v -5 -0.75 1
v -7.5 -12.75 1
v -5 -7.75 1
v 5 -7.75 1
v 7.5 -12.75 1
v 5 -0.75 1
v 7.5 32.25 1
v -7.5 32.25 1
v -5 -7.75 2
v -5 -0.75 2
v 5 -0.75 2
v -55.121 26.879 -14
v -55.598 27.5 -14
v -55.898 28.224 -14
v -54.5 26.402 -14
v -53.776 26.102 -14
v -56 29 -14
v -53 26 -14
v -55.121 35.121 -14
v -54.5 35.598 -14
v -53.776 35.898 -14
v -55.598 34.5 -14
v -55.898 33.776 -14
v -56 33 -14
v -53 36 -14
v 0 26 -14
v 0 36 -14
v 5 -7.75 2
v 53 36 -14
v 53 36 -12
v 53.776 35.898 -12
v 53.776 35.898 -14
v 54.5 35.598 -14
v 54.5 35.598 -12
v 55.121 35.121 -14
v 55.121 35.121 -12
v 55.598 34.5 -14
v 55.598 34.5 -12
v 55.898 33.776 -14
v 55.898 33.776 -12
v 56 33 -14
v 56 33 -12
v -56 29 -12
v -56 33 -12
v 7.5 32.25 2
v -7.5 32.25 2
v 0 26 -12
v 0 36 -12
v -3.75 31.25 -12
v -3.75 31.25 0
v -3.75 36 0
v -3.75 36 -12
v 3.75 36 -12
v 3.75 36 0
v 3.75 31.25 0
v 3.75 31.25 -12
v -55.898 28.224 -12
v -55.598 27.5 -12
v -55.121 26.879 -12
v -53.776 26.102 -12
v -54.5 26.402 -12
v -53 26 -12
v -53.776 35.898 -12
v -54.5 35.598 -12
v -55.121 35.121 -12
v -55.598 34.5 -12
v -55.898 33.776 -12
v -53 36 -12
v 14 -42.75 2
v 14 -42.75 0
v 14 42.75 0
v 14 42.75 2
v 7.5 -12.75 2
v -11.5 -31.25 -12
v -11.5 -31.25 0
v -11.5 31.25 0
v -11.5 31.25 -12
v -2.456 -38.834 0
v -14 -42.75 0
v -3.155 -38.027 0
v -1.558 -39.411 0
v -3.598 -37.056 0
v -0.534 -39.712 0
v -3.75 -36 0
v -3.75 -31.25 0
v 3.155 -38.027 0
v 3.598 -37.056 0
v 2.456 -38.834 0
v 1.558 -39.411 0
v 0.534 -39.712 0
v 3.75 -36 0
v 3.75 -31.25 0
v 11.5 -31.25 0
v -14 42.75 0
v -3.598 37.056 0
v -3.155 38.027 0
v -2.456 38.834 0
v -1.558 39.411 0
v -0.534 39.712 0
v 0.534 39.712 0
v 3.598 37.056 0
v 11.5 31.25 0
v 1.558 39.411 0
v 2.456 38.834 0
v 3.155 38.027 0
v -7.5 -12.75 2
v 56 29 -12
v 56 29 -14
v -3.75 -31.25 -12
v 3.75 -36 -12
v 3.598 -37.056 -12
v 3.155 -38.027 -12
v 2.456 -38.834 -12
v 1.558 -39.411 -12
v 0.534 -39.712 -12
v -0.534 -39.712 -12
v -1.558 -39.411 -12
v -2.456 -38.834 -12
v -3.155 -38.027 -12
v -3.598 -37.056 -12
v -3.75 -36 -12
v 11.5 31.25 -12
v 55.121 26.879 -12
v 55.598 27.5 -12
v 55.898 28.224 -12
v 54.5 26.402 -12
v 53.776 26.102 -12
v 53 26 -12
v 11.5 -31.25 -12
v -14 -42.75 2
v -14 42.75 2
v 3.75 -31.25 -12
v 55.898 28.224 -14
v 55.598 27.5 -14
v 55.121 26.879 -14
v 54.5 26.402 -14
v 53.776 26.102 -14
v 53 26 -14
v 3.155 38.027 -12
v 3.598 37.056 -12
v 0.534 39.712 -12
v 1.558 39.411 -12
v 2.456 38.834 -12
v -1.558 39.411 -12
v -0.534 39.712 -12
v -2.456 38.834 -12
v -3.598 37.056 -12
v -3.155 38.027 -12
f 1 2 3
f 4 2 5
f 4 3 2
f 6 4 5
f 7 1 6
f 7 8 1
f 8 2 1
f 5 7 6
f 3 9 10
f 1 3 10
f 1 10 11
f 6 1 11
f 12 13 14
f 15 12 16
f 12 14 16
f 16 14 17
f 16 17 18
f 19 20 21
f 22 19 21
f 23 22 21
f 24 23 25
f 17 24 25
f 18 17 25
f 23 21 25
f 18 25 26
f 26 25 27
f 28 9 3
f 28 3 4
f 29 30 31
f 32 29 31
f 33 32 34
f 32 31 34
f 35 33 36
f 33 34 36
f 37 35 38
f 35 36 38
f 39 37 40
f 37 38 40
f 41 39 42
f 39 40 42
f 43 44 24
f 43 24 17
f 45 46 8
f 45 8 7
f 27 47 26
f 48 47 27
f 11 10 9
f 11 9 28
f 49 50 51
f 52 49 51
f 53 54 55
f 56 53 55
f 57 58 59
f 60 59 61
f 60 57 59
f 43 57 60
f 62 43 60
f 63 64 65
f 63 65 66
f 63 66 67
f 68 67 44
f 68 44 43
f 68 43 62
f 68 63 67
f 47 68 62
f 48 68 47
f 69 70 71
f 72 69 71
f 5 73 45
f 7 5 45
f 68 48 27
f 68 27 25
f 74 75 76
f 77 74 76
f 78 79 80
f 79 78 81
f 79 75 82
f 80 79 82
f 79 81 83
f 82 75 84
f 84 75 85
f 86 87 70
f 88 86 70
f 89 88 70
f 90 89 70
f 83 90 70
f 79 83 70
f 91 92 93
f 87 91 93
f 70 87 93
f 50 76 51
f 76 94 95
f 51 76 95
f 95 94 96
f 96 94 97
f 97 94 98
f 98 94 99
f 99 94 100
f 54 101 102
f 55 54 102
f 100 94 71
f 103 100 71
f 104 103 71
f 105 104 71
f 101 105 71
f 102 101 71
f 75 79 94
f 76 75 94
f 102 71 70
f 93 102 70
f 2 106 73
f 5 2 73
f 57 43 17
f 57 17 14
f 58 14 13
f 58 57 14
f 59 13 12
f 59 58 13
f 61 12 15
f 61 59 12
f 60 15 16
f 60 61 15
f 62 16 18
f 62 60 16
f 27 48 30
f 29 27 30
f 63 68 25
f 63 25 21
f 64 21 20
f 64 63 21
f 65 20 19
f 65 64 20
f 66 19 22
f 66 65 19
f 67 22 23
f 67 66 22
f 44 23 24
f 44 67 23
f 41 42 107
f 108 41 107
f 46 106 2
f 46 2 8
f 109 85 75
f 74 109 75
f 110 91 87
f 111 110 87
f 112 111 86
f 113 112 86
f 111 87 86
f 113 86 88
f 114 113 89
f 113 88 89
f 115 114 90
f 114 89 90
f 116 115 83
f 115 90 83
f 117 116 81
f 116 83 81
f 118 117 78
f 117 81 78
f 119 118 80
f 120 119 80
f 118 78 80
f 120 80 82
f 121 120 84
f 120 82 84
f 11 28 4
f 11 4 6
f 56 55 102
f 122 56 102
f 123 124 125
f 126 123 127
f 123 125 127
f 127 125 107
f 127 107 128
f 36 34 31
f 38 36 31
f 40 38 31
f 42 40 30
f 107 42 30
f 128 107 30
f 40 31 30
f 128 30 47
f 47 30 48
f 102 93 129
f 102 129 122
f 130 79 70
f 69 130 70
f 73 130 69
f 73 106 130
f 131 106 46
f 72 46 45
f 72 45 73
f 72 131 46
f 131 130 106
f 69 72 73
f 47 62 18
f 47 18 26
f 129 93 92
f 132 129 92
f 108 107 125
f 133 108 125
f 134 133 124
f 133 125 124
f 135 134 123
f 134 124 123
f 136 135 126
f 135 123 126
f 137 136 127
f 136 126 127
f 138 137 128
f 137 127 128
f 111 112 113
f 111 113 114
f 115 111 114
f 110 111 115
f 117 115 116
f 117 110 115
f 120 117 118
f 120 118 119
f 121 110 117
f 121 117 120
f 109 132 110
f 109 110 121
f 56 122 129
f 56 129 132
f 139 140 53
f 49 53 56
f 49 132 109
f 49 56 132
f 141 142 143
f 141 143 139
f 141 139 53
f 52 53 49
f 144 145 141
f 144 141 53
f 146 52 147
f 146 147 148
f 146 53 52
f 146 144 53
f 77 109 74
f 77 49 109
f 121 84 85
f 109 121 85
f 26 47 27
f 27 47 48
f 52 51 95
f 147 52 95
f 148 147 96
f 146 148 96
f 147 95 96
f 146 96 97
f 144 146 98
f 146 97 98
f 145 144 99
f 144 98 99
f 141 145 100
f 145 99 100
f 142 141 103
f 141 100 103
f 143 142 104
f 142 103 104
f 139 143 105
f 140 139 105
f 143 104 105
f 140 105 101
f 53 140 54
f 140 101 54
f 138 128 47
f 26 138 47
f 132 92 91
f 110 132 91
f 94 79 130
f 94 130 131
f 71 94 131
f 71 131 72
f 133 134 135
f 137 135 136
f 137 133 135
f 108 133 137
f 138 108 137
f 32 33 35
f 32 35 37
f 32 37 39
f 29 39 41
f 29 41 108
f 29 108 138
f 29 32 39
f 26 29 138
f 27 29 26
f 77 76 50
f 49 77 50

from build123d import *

# Parameters (mm, degrees)
SKETCH_1_W          = 28
SKETCH_1_H          = 85.5
EXTRUDE_1_DEPTH     = 2
SKETCH_2_W          = 15
SKETCH_2_H          = 45
SKETCH_2_W_2        = 10
SKETCH_2_H_2        = 7
CUT_EXTRUDE_1_DEPTH = 1
SKETCH_3_W          = 7.5
SKETCH_3_H          = 62.5
SKETCH_3_W_2        = 7.75
EXTRUDE_2_DEPTH     = 12
EXTRUDE_3_DEPTH     = 2


with BuildPart() as part:
    # 草图1 → 凸台-拉伸1 (new body)
    with BuildSketch(Plane.XY):
        Rectangle(SKETCH_1_W, SKETCH_1_H)
    extrude(amount=EXTRUDE_1_DEPTH)

    # 草图2 → 切除-拉伸1 (cut)
    with BuildSketch(Plane.XY.offset(2)):
        with Locations((0, 9.75)):
            Rectangle(SKETCH_2_W, SKETCH_2_H)
        with Locations((0, -4.25)):
            Rectangle(SKETCH_2_W_2, SKETCH_2_H_2, mode=Mode.SUBTRACT)
    extrude(amount=-CUT_EXTRUDE_1_DEPTH, mode=Mode.SUBTRACT)

    # 草图3 → 凸台-拉伸2 (add)
    with BuildSketch(Plane(origin=(0, 0, 0), x_dir=(-1, 0, 0), z_dir=(0, 0, -1))):
        Rectangle(SKETCH_3_W, SKETCH_3_H)
        with Locations((-7.625, 0)):
            Rectangle(SKETCH_3_W_2, SKETCH_3_H)
        with Locations((7.625, 0)):
            Rectangle(SKETCH_3_W_2, SKETCH_3_H)
        with BuildLine():
            Line((-3.75, 36), (-3.75, 31.25))
            Line((-3.75, 31.25), (3.75, 31.25))
            Line((3.75, 31.25), (3.75, 36))
            ThreePointArc((3.75, 36), (0, 39.75), (-3.75, 36))
        make_face()
        with BuildLine():
            Line((3.75, -31.25), (-3.75, -31.25))
            Line((-3.75, -31.25), (-3.75, -36))
            ThreePointArc((-3.75, -36), (0, -39.75), (3.75, -36))
            Line((3.75, -36), (3.75, -31.25))
        make_face()
    extrude(amount=EXTRUDE_2_DEPTH)


with BuildPart() as body_2:
    # 草图4 → 凸台-拉伸3 (new body)
    with BuildSketch(Plane(origin=(0, 0, -12), x_dir=(-1, 0, 0), z_dir=(0, 0, -1))):
        with BuildLine():
            Line((0, 36), (53, 36))
            ThreePointArc((53, 36), (55.121320344, 35.121320344), (56, 33))
            Line((56, 33), (56, 29))
            ThreePointArc((56, 29), (55.121320344, 26.878679656), (53, 26))
            Line((53, 26), (0, 26))
            Line((0, 26), (0, 36))
        make_face()
    extrude(amount=EXTRUDE_3_DEPTH)


with BuildPart() as body_3:
    # 镜向2: mirrored copy
    add(body_2.part.mirror(Plane(origin=(0, 0, 0), x_dir=(0, 0, 1), z_dir=(1, 0, 0))))


solid = Compound([part.part, body_2.part, body_3.part])
